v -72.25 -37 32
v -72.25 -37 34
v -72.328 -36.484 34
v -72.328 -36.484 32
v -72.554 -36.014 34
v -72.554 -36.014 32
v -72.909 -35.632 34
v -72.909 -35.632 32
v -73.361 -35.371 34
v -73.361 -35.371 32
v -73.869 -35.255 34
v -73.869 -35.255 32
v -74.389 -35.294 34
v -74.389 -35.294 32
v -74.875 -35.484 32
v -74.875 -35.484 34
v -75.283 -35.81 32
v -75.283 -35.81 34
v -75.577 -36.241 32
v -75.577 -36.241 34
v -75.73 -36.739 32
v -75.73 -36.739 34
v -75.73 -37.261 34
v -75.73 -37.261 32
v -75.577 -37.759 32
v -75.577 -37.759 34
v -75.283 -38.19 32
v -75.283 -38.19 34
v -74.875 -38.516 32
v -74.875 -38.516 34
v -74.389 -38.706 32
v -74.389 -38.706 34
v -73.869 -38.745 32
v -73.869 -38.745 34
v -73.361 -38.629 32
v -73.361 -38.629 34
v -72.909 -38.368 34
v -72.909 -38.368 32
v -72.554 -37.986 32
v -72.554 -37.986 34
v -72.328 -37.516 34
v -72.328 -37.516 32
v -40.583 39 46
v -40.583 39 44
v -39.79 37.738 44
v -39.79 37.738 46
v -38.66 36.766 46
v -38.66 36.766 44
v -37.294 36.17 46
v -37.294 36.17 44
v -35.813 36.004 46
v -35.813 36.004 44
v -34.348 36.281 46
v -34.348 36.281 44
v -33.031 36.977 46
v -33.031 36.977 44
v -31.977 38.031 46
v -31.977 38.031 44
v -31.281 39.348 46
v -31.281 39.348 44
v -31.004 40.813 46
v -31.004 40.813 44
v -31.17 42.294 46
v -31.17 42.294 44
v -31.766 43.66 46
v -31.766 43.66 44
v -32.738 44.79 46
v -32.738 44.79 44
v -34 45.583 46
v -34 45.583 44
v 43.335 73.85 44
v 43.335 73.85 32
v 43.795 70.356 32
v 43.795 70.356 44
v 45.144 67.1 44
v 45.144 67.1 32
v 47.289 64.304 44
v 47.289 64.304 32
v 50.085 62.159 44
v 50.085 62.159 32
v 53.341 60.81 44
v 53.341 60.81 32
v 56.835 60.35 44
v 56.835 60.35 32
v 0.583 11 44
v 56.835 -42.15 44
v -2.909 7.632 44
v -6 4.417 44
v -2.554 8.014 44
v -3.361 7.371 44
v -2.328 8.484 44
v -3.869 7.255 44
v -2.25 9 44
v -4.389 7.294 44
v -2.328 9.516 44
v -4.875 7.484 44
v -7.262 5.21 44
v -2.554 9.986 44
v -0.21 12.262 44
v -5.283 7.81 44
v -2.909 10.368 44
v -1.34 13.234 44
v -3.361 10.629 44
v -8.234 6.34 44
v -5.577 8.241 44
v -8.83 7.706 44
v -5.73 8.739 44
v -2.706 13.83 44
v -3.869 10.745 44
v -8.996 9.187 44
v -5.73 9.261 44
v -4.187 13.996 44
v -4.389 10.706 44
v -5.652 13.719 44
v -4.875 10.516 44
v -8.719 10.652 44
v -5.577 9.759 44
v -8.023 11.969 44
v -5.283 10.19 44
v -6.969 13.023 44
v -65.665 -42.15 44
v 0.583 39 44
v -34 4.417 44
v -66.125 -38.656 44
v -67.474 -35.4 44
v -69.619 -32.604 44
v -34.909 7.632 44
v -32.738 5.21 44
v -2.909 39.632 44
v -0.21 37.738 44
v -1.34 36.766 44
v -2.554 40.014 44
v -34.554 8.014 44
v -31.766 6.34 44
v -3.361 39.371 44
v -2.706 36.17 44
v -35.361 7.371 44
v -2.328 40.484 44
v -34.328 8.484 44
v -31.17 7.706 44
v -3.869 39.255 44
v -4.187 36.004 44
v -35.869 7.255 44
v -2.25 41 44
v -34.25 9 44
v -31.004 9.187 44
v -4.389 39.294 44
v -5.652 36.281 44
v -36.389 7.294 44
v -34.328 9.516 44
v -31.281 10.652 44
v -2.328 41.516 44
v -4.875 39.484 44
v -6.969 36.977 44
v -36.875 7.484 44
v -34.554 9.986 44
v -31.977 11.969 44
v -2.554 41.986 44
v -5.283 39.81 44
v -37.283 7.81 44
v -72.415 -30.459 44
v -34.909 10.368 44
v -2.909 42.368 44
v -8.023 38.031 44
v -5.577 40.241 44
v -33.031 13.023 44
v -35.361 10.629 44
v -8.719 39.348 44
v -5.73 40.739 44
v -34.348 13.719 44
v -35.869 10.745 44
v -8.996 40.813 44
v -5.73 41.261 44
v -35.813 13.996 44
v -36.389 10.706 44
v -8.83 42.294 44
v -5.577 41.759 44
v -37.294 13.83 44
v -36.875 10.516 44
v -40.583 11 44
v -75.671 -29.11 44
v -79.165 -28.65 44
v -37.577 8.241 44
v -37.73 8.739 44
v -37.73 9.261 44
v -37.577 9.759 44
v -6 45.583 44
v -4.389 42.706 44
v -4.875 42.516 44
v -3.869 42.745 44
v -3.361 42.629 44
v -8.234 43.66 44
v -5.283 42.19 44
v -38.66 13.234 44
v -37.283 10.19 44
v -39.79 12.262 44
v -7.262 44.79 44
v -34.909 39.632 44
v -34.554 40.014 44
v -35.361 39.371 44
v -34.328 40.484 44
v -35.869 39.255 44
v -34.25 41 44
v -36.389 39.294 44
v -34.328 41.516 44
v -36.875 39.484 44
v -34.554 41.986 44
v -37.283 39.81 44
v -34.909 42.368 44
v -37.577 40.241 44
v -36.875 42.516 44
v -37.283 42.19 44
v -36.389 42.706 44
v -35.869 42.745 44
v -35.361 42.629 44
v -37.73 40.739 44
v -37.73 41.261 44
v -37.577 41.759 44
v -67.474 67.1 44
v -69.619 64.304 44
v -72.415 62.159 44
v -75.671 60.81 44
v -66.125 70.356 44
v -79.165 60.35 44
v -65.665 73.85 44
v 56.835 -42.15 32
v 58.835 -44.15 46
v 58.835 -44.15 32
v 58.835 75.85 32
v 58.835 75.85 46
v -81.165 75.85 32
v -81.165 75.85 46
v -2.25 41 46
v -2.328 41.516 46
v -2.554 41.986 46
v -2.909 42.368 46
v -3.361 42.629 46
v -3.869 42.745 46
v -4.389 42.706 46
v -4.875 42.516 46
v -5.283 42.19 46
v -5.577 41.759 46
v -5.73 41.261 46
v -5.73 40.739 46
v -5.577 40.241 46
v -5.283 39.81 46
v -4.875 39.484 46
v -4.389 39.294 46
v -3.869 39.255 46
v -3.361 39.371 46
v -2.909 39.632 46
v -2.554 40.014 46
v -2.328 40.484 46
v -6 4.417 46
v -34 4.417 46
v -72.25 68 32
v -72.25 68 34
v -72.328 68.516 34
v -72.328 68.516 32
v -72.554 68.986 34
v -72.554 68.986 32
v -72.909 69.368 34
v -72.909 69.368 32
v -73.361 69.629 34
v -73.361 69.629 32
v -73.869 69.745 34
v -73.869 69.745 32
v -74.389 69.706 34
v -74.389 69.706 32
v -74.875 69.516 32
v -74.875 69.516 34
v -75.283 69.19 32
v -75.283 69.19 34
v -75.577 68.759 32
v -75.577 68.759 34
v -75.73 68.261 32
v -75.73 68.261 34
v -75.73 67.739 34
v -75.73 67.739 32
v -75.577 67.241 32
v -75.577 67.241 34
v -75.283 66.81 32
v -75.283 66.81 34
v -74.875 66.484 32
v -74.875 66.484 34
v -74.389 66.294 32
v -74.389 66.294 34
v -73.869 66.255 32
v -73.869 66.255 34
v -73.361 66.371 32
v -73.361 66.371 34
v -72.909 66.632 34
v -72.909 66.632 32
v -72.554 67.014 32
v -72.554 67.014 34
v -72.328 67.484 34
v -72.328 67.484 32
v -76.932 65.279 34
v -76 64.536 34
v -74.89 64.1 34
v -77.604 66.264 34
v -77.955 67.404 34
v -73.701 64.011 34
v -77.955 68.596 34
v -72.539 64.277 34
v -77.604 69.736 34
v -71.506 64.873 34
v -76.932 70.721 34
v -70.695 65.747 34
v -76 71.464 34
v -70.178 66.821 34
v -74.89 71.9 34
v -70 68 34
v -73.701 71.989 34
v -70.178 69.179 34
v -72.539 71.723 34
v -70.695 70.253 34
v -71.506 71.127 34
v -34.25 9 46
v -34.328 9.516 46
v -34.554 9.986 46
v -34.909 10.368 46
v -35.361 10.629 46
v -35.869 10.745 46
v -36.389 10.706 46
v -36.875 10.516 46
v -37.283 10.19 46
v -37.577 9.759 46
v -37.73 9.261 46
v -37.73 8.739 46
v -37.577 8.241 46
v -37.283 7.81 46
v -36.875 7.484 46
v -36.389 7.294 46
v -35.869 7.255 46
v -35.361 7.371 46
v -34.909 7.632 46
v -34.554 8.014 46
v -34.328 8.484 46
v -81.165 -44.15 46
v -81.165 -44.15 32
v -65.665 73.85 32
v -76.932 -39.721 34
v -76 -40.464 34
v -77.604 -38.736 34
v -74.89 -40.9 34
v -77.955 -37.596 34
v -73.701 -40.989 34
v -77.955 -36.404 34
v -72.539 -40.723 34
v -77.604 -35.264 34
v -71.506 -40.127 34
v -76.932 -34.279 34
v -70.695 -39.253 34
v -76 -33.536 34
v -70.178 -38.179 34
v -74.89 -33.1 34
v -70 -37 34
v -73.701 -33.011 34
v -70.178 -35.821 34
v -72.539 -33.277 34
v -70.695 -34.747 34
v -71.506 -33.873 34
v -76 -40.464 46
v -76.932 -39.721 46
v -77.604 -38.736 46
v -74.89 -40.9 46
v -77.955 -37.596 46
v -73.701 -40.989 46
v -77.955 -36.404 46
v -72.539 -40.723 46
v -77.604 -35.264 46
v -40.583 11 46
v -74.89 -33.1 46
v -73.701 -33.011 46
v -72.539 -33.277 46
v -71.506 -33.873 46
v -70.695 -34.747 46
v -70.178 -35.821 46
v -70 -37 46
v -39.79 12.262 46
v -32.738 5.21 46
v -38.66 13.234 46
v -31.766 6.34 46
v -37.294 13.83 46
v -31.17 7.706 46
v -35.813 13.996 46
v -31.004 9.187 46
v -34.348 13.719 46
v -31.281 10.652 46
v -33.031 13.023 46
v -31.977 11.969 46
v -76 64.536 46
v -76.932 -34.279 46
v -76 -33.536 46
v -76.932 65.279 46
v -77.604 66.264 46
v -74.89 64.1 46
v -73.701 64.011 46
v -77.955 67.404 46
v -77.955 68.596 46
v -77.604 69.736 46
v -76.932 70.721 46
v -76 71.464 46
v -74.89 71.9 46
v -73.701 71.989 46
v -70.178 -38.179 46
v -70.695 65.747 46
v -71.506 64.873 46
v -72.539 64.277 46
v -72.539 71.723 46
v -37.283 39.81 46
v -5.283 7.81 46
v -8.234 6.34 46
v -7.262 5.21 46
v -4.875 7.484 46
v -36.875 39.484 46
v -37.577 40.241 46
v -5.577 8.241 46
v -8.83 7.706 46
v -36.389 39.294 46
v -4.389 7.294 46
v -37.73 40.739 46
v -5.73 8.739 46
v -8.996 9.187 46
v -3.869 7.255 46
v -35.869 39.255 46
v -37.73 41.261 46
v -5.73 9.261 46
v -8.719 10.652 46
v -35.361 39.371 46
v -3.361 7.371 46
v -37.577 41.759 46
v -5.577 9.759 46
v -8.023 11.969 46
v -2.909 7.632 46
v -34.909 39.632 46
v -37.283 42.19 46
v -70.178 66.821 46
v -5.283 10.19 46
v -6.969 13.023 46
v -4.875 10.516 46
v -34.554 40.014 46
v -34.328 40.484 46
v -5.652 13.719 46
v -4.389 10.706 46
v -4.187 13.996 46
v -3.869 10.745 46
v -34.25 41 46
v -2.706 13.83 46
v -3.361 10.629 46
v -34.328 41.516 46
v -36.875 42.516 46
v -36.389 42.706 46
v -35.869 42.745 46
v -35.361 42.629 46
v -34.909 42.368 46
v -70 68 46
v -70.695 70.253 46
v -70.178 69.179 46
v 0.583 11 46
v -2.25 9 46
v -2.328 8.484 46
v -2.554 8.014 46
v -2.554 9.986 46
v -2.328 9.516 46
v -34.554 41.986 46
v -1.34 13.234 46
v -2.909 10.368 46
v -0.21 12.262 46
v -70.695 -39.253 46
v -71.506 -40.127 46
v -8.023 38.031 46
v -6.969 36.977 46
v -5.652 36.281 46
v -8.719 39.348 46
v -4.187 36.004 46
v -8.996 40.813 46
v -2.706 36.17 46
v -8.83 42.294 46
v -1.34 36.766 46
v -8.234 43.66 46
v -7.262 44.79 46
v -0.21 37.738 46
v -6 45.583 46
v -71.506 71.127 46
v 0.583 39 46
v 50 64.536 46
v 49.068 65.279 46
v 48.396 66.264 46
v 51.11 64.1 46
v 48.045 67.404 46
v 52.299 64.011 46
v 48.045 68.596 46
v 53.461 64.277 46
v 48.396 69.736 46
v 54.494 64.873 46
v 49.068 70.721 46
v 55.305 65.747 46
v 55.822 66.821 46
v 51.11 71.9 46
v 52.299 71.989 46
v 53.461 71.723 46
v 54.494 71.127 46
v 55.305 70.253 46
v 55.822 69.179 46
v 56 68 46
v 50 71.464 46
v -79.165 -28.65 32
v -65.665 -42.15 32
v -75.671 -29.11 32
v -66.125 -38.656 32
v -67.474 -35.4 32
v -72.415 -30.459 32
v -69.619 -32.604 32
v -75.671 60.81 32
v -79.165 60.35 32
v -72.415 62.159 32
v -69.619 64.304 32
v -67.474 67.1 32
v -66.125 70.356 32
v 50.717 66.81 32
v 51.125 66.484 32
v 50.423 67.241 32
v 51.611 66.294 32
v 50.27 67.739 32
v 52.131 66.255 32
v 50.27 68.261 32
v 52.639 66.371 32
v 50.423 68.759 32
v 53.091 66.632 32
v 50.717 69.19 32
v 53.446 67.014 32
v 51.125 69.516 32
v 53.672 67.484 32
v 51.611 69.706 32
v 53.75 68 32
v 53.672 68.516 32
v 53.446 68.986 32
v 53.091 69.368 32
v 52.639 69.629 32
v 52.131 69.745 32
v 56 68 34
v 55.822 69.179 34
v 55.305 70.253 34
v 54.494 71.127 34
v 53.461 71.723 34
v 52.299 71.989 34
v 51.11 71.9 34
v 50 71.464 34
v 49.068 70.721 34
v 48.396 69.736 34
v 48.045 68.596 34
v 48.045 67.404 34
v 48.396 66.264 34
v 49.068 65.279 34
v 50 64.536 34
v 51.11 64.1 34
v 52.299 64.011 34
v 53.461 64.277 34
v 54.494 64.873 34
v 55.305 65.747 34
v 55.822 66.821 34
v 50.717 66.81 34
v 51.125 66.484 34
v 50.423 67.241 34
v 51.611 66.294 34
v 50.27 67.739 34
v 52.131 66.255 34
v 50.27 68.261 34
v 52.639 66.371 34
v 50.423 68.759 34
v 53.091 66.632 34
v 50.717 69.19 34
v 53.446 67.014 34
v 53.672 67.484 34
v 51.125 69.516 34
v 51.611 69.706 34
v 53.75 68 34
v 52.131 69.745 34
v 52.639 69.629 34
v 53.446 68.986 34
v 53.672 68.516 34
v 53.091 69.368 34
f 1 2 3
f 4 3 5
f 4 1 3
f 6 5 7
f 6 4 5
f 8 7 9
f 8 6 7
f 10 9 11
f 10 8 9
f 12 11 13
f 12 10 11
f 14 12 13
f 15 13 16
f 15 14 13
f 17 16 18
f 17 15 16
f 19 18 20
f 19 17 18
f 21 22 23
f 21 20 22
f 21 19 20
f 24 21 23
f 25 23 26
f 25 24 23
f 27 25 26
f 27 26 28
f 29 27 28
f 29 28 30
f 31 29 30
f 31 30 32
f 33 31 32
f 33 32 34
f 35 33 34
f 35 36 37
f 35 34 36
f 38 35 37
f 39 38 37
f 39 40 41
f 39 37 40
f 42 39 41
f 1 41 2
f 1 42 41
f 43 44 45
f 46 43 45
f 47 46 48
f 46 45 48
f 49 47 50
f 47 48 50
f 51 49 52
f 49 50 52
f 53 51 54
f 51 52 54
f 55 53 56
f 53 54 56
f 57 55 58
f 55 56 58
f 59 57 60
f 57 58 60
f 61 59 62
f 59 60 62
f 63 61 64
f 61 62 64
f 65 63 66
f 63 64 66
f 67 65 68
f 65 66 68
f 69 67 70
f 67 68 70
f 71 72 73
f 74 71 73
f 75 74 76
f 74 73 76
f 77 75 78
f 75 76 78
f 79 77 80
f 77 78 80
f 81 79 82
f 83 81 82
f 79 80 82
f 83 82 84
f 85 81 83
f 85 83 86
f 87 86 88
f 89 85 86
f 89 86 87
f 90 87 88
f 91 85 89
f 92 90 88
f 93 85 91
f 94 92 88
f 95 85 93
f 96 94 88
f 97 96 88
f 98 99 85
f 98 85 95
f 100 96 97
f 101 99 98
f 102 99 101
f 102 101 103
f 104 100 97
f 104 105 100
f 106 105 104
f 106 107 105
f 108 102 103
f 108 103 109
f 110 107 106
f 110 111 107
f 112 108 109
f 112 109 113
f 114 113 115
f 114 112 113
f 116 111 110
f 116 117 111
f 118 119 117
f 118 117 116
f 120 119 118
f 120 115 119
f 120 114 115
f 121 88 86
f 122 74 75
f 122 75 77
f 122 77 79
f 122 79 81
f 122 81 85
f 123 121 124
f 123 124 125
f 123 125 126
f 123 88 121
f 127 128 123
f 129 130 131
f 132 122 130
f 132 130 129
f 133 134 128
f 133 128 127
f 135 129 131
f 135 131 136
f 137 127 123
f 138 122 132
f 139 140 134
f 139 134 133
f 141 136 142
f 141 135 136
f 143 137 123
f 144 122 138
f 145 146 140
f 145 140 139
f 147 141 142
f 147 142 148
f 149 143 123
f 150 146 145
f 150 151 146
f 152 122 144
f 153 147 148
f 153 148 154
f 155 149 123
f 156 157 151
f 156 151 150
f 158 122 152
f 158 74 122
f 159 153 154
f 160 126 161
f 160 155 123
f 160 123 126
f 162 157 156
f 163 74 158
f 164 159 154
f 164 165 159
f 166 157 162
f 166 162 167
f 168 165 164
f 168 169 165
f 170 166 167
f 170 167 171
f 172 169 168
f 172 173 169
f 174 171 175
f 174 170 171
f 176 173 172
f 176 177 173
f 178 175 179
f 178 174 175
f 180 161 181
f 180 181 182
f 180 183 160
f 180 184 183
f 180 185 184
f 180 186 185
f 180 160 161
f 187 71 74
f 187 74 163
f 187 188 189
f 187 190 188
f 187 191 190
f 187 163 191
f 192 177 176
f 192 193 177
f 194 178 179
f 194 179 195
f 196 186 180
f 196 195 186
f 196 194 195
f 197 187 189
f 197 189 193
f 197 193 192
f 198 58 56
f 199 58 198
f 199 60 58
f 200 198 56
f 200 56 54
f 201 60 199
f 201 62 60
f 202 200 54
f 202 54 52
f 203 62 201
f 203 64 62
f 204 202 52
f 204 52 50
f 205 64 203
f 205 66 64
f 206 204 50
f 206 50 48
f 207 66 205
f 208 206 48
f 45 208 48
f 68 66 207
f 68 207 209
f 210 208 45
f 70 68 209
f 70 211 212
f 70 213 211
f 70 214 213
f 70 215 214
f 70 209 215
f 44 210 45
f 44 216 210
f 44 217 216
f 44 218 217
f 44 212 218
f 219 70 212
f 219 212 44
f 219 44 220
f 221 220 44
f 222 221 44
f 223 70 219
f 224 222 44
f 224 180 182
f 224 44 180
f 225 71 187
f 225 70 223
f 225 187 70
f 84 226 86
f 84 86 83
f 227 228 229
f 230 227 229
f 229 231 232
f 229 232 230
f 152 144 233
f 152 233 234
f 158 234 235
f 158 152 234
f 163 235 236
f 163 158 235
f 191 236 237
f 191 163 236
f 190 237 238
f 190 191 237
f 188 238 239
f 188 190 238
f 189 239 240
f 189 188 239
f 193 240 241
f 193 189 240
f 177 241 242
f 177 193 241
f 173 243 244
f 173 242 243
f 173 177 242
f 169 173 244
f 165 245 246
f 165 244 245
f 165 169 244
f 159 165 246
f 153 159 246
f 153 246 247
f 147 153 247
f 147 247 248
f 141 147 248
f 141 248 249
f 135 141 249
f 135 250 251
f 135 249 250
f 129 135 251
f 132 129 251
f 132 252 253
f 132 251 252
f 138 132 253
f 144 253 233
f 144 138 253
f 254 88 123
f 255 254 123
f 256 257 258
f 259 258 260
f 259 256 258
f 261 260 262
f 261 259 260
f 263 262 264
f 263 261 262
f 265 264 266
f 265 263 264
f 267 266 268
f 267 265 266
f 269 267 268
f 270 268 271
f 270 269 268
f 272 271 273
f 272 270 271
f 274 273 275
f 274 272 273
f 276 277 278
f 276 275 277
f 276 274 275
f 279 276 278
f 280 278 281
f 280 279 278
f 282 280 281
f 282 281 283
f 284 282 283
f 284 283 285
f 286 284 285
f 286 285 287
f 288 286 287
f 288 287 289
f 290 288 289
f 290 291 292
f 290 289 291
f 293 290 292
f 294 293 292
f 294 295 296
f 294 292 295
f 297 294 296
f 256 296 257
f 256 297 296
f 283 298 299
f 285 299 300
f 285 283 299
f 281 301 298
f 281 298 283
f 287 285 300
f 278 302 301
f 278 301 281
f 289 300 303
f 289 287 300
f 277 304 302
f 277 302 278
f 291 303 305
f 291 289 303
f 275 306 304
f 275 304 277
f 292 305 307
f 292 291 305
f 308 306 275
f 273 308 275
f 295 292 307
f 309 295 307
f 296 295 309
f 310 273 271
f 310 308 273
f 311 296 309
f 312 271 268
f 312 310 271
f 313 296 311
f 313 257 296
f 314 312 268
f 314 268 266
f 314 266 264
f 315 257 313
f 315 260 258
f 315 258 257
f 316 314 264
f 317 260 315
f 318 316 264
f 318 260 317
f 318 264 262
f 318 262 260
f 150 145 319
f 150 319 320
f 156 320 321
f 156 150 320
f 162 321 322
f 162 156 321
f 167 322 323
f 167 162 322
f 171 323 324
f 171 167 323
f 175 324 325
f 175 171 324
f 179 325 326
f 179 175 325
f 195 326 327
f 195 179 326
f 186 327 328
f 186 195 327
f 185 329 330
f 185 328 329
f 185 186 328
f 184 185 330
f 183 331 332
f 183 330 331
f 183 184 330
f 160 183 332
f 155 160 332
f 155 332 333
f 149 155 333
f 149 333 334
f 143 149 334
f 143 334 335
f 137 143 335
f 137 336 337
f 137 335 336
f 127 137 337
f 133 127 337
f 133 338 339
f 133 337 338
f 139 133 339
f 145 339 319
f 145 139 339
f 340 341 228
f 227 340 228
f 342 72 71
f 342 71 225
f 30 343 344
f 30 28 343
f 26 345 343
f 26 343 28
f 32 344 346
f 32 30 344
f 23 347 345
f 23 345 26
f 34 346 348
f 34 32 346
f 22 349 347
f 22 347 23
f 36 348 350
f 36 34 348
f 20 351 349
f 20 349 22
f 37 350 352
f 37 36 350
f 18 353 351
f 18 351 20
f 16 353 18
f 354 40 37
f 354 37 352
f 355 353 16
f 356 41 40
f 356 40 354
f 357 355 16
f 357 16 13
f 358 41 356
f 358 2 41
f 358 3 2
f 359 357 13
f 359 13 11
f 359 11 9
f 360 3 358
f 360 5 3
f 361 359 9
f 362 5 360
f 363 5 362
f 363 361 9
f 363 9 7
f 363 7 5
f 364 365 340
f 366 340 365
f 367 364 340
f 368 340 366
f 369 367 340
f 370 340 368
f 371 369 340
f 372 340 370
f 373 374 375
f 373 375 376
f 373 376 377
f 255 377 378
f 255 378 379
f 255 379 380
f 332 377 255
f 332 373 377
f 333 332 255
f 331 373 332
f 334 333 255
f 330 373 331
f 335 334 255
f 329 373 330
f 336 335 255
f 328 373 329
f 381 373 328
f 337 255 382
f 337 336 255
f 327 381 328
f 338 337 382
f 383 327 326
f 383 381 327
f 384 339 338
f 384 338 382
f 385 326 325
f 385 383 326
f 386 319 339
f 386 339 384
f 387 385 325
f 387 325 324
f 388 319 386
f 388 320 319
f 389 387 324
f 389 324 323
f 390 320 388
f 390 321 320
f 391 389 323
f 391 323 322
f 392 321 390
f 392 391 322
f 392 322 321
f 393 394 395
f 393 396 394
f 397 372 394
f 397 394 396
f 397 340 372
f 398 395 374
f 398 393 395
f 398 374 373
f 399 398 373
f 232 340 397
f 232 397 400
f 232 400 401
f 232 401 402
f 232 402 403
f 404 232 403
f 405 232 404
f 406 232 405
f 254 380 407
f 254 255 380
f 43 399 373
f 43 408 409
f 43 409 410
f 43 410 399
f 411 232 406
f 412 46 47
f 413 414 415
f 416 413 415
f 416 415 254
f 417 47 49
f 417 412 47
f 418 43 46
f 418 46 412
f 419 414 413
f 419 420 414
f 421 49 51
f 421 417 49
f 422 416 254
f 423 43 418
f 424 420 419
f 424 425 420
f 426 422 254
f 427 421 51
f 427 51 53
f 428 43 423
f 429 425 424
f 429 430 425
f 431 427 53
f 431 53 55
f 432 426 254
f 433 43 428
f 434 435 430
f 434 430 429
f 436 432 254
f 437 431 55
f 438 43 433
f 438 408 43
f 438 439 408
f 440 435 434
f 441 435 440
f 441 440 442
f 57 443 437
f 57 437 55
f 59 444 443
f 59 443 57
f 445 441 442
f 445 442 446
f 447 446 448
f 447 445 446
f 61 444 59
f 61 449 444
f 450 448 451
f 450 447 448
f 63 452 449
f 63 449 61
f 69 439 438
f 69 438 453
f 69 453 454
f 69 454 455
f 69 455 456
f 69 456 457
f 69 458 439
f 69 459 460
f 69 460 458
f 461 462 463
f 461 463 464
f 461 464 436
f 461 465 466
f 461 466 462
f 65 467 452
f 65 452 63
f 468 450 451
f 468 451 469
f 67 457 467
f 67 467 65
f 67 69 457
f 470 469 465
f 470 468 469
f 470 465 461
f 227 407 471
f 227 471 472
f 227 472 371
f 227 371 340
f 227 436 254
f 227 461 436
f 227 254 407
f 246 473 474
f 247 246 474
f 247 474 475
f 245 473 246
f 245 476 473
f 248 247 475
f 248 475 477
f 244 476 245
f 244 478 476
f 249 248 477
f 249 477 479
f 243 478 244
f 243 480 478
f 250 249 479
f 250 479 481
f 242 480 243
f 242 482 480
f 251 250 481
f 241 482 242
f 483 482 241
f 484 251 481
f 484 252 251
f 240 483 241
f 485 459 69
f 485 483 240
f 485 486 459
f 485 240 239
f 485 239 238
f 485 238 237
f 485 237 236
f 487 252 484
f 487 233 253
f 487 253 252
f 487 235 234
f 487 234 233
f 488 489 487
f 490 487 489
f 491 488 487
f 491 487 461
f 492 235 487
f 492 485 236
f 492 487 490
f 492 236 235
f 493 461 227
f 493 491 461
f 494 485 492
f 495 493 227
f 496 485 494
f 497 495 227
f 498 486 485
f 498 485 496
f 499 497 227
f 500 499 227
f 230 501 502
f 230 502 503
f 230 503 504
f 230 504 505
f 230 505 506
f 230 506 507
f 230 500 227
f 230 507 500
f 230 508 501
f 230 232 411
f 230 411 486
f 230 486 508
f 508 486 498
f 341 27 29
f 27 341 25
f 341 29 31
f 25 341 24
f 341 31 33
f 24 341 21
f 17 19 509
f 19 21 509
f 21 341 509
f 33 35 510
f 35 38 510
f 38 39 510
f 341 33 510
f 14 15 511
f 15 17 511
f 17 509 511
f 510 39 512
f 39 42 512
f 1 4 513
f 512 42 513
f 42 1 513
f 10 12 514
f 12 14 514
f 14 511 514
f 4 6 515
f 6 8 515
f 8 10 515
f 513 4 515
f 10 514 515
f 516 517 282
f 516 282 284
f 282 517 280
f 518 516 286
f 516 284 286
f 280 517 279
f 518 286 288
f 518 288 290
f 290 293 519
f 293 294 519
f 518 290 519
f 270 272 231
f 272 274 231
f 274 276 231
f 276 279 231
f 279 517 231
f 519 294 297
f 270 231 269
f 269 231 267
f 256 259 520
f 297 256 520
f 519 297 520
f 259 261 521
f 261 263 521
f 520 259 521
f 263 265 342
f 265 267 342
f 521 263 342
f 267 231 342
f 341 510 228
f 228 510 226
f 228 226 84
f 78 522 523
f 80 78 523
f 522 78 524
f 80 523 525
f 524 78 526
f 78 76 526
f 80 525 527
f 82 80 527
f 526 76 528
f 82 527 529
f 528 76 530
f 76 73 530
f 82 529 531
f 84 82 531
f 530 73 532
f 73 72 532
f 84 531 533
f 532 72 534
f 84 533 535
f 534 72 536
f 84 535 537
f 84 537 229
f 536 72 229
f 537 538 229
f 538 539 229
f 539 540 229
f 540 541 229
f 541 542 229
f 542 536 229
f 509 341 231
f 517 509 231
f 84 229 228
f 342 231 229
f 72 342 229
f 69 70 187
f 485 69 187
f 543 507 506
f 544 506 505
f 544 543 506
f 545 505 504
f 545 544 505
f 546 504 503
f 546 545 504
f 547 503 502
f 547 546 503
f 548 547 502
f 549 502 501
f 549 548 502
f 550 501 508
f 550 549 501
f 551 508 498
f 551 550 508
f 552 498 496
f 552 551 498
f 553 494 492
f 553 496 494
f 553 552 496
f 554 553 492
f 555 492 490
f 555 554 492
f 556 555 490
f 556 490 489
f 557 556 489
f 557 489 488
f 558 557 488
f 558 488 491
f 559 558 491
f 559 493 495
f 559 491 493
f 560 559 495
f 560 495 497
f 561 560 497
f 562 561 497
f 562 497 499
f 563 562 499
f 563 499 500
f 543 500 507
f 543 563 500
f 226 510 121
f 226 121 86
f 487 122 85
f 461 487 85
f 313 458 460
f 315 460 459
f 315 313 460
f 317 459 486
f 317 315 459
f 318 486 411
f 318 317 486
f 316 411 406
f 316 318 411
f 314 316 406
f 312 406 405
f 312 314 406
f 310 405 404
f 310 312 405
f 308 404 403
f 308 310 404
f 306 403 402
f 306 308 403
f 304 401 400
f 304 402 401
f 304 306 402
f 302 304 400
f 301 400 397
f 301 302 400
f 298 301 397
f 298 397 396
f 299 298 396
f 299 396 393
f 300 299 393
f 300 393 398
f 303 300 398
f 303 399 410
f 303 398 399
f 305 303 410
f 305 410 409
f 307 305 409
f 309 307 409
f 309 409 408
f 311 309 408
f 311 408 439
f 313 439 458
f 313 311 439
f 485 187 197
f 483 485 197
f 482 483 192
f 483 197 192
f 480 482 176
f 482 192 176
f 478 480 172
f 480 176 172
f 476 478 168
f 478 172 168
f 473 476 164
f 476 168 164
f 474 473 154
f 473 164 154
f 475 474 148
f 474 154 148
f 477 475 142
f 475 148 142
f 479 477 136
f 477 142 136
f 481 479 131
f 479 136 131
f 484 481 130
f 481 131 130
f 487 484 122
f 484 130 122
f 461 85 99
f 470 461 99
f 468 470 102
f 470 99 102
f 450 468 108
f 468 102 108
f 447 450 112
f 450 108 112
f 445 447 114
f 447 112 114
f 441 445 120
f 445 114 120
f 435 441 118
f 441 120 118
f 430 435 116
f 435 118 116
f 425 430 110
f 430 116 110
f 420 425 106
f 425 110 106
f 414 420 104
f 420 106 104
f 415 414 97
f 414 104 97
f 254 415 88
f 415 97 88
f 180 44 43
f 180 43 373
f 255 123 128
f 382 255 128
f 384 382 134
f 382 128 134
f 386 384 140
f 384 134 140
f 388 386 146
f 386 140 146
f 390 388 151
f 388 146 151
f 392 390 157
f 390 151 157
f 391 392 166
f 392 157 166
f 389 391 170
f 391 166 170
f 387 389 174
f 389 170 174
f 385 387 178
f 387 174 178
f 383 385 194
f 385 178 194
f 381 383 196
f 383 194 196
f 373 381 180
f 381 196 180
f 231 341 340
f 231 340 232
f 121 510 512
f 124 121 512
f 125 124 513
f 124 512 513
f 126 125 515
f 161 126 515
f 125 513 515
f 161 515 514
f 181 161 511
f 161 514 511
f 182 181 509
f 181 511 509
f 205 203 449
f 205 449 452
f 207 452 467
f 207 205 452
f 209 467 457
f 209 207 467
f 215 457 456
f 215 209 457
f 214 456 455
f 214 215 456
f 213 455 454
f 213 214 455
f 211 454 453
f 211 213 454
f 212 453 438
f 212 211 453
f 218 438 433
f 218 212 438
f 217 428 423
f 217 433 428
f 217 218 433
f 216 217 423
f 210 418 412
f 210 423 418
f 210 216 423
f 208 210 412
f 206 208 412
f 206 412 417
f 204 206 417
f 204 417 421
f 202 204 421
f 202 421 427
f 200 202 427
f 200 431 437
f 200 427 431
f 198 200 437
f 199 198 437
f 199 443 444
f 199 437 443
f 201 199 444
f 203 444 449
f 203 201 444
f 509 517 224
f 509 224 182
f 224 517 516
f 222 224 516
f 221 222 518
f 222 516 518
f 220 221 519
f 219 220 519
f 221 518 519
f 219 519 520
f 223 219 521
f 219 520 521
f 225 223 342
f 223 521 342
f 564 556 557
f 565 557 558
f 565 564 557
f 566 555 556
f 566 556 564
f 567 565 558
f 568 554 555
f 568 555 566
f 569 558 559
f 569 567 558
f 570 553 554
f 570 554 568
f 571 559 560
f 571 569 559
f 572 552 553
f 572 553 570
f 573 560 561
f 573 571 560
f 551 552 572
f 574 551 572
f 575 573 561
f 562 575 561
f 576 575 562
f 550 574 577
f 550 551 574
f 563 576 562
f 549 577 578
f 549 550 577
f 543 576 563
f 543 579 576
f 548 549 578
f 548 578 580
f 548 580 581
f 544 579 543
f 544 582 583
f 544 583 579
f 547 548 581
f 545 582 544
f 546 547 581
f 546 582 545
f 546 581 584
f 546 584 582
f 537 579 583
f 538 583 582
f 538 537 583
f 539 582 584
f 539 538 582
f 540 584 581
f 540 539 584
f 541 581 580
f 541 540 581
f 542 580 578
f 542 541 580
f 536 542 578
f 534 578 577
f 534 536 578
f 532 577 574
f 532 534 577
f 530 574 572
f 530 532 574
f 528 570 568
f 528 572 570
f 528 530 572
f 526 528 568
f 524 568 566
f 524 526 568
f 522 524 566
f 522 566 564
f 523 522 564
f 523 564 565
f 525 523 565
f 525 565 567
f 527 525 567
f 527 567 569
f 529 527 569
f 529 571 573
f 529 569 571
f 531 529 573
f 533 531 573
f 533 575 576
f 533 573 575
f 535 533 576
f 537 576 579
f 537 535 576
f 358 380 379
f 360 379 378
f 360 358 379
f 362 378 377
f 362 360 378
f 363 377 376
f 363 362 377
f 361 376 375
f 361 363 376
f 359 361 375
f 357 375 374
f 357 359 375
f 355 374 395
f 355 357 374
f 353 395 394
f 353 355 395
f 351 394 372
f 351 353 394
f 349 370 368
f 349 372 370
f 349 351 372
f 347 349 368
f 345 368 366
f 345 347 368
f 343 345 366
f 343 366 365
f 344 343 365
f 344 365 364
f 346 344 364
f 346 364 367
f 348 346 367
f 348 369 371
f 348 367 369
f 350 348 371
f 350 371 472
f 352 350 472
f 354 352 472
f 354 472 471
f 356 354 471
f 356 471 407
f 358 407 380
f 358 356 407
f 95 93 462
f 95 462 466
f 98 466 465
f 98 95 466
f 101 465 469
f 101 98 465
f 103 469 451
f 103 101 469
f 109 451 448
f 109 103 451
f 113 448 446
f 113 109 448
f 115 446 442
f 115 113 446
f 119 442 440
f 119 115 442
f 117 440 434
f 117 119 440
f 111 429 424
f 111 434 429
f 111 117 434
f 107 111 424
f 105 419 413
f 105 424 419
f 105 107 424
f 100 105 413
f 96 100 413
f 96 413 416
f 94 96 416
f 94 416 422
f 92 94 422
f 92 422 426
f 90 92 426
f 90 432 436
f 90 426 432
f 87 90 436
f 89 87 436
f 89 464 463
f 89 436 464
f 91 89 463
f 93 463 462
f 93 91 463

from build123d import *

# Parameters (mm, degrees)
SKETCH009_W          = 140
SKETCH009_H          = 120
PAD004_DEPTH         = 14
POCKET005_DEPTH      = 12
SKETCH011_R          = 1.75
POCKET006_DEPTH      = 0.001
POCKET006_DEPTH_BACK = 14.001
SKETCH012_R          = 4
POCKET007_DEPTH      = 12.001
SKETCH013_R          = 1.75
POCKET008_DEPTH      = 14.001


with BuildPart() as part:
    # Sketch009 → Pad004 (new body)
    with BuildSketch(Plane.XY):
        with Locations((-11.165, 15.85)):
            Rectangle(SKETCH009_W, SKETCH009_H)
    extrude(amount=PAD004_DEPTH)

    # Sketch010 → Pocket005 (cut)
    with BuildSketch(Plane.XY):
        with BuildLine():
            ThreePointArc((-79.165, 60.35), (-69.619058, 64.304058), (-65.665, 73.85))
            Line((43.335, 73.85), (-65.665, 73.85))
            ThreePointArc((43.335, 73.85), (47.289058, 64.304058), (56.835, 60.35))
            Line((56.835, -42.15), (56.835, 60.35))
            Line((-65.665, -42.15), (56.835, -42.15))
            ThreePointArc((-65.665, -42.15), (-69.619058, -32.604058), (-79.165, -28.65))
            Line((-79.165, 60.35), (-79.165, -28.65))
        make_face()
    extrude(amount=POCKET005_DEPTH, mode=Mode.SUBTRACT)

    # Sketch011 → Pocket006 (cut, two sides)
    with BuildSketch(Plane.XY) as pocket006_sk:
        with Locations((-74, 68)):
            Circle(SKETCH011_R)
        with Locations((52, 68)):
            Circle(SKETCH011_R)
        with Locations((-74, -37)):
            Circle(SKETCH011_R)
    extrude(amount=-POCKET006_DEPTH, mode=Mode.SUBTRACT)
    extrude(pocket006_sk.sketch, amount=POCKET006_DEPTH_BACK, mode=Mode.SUBTRACT)

    # Sketch012 (on DatumPlane) → Pocket007 (cut, through all)
    with BuildSketch(Plane.XY.offset(2)):
        with Locations((-74, 68)):
            Circle(SKETCH012_R)
        with Locations((52, 68)):
            Circle(SKETCH012_R)
        with Locations((-74, -37)):
            Circle(SKETCH012_R)
    extrude(amount=POCKET007_DEPTH, mode=Mode.SUBTRACT)

    # Sketch013 → Pocket008 (cut, through all)
    with BuildSketch(Plane.XY):
        with Locations((-36, 41)):
            Circle(SKETCH013_R)
        with Locations((-4, 41)):
            Circle(SKETCH013_R)
        with Locations((-36, 9)):
            Circle(SKETCH013_R)
        with Locations((-4, 9)):
            Circle(SKETCH013_R)
        with BuildLine():
            ThreePointArc((-40.582576, 39), (-32.464466, 37.464466), (-34, 45.582576))
            Line((-34, 45.582576), (-6, 45.582576))
            ThreePointArc((-6, 45.582576), (-7.535534, 37.464466), (0.582576, 39))
            Line((0.582576, 39), (0.582576, 11))
            ThreePointArc((0.582576, 11), (-7.535534, 12.535534), (-6, 4.417424))
            Line((-6, 4.417424), (-34, 4.417424))
            ThreePointArc((-34, 4.417424), (-32.464466, 12.535534), (-40.582576, 11))
            Line((-40.582576, 39), (-40.582576, 11))
        make_face()
    extrude(amount=POCKET008_DEPTH, mode=Mode.SUBTRACT)


with BuildPart() as part_1:
    # Body001 placement: moved
    add(part.part.moved(Location((0, 0, 32))))


solid = part_1.part
